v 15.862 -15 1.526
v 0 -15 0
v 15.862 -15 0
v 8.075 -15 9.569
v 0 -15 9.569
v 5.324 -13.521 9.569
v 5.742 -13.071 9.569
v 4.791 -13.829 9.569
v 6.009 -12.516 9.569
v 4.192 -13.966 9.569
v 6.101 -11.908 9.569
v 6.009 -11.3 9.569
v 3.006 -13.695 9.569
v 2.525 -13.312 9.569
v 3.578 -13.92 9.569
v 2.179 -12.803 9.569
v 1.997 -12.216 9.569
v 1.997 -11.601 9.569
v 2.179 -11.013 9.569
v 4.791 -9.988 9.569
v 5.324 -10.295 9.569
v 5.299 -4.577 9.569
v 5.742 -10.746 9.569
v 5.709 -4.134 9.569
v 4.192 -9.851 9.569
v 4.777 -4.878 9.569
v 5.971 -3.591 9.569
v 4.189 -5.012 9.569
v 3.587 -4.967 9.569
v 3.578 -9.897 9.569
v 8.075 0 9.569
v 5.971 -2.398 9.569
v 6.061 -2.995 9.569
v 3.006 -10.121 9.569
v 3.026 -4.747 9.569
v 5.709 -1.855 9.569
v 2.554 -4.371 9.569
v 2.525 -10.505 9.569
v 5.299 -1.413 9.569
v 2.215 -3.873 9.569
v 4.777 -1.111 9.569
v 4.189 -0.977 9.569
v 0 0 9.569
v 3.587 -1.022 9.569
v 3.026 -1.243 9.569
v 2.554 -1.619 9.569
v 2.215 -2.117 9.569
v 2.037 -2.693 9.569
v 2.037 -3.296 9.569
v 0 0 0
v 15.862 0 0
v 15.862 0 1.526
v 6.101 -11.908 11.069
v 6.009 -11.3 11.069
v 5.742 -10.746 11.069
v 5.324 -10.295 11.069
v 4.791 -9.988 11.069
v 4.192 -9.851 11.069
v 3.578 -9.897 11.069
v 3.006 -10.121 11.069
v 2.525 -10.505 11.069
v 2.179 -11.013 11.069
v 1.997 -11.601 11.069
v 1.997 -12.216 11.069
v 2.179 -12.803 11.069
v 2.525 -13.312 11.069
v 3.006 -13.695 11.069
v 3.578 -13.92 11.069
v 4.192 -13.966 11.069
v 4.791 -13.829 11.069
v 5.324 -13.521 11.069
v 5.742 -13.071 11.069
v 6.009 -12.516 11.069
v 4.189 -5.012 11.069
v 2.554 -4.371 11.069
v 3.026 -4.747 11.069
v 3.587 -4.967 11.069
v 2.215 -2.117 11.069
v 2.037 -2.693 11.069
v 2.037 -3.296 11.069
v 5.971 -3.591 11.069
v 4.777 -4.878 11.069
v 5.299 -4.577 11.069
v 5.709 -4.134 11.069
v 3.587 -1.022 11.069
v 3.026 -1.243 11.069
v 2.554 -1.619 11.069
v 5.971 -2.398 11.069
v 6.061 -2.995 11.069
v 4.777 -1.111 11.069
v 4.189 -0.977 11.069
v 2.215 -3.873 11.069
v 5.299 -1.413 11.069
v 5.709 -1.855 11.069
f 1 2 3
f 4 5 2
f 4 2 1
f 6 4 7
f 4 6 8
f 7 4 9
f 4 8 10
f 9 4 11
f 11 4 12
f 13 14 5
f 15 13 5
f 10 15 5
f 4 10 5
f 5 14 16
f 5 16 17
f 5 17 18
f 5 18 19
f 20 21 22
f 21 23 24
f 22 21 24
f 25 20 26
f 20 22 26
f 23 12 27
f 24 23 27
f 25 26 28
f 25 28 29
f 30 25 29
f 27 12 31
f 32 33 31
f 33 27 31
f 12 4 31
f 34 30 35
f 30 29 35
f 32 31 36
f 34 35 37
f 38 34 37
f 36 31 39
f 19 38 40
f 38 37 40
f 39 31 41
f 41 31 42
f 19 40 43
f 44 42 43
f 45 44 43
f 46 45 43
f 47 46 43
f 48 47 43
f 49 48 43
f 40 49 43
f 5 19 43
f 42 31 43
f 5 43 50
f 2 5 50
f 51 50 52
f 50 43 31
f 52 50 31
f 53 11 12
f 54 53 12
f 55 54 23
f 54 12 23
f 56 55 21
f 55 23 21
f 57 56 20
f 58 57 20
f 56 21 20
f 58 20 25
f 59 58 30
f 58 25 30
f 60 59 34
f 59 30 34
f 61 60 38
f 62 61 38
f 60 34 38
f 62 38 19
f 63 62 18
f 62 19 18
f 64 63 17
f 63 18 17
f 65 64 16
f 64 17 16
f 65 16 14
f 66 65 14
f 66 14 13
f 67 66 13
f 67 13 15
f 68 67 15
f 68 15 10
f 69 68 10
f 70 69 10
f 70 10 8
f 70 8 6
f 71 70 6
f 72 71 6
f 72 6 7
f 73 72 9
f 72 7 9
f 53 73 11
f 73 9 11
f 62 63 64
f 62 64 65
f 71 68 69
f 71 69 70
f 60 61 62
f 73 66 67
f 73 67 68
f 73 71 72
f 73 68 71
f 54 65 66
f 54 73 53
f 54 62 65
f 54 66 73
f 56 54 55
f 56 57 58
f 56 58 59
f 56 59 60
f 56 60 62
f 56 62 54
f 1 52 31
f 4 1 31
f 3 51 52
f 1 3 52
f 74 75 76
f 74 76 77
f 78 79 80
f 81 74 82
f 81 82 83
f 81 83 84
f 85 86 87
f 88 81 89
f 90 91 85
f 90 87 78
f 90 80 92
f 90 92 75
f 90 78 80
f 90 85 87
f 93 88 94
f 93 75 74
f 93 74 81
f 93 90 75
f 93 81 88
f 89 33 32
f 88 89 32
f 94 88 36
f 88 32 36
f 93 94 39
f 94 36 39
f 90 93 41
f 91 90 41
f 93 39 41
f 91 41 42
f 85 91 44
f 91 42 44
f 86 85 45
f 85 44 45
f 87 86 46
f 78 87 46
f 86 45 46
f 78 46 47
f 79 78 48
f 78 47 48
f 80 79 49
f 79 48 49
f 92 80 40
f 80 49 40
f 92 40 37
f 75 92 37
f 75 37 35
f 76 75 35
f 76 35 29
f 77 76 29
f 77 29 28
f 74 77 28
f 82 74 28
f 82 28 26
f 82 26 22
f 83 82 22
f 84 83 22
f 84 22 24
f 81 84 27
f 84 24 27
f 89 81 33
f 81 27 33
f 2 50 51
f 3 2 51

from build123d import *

# Parameters (mm, degrees)
F1_DEPTH = 15
F2_R     = 2.063261
F2_R_2   = 2.023213
F3_DEPTH = 1.5


with BuildPart() as f1:
    # F0 (on Front) → F1 (new body)
    with BuildSketch(Plane.XZ):
        Polygon((0, 9.569434), (0, 0), (15.861647, 0), (15.861647, 1.526309), (8.075217, 9.569434), align=None)
    extrude(amount=F1_DEPTH)

    # F2 (on face) → F3 (join)
    with BuildSketch(Plane.XY.offset(9.569434)):
        with Locations((4.037608, -11.90827)):
            Circle(F2_R)
        with Locations((4.037608, -2.994718)):
            Circle(F2_R_2)
    extrude(amount=F3_DEPTH)


solid = f1.part
